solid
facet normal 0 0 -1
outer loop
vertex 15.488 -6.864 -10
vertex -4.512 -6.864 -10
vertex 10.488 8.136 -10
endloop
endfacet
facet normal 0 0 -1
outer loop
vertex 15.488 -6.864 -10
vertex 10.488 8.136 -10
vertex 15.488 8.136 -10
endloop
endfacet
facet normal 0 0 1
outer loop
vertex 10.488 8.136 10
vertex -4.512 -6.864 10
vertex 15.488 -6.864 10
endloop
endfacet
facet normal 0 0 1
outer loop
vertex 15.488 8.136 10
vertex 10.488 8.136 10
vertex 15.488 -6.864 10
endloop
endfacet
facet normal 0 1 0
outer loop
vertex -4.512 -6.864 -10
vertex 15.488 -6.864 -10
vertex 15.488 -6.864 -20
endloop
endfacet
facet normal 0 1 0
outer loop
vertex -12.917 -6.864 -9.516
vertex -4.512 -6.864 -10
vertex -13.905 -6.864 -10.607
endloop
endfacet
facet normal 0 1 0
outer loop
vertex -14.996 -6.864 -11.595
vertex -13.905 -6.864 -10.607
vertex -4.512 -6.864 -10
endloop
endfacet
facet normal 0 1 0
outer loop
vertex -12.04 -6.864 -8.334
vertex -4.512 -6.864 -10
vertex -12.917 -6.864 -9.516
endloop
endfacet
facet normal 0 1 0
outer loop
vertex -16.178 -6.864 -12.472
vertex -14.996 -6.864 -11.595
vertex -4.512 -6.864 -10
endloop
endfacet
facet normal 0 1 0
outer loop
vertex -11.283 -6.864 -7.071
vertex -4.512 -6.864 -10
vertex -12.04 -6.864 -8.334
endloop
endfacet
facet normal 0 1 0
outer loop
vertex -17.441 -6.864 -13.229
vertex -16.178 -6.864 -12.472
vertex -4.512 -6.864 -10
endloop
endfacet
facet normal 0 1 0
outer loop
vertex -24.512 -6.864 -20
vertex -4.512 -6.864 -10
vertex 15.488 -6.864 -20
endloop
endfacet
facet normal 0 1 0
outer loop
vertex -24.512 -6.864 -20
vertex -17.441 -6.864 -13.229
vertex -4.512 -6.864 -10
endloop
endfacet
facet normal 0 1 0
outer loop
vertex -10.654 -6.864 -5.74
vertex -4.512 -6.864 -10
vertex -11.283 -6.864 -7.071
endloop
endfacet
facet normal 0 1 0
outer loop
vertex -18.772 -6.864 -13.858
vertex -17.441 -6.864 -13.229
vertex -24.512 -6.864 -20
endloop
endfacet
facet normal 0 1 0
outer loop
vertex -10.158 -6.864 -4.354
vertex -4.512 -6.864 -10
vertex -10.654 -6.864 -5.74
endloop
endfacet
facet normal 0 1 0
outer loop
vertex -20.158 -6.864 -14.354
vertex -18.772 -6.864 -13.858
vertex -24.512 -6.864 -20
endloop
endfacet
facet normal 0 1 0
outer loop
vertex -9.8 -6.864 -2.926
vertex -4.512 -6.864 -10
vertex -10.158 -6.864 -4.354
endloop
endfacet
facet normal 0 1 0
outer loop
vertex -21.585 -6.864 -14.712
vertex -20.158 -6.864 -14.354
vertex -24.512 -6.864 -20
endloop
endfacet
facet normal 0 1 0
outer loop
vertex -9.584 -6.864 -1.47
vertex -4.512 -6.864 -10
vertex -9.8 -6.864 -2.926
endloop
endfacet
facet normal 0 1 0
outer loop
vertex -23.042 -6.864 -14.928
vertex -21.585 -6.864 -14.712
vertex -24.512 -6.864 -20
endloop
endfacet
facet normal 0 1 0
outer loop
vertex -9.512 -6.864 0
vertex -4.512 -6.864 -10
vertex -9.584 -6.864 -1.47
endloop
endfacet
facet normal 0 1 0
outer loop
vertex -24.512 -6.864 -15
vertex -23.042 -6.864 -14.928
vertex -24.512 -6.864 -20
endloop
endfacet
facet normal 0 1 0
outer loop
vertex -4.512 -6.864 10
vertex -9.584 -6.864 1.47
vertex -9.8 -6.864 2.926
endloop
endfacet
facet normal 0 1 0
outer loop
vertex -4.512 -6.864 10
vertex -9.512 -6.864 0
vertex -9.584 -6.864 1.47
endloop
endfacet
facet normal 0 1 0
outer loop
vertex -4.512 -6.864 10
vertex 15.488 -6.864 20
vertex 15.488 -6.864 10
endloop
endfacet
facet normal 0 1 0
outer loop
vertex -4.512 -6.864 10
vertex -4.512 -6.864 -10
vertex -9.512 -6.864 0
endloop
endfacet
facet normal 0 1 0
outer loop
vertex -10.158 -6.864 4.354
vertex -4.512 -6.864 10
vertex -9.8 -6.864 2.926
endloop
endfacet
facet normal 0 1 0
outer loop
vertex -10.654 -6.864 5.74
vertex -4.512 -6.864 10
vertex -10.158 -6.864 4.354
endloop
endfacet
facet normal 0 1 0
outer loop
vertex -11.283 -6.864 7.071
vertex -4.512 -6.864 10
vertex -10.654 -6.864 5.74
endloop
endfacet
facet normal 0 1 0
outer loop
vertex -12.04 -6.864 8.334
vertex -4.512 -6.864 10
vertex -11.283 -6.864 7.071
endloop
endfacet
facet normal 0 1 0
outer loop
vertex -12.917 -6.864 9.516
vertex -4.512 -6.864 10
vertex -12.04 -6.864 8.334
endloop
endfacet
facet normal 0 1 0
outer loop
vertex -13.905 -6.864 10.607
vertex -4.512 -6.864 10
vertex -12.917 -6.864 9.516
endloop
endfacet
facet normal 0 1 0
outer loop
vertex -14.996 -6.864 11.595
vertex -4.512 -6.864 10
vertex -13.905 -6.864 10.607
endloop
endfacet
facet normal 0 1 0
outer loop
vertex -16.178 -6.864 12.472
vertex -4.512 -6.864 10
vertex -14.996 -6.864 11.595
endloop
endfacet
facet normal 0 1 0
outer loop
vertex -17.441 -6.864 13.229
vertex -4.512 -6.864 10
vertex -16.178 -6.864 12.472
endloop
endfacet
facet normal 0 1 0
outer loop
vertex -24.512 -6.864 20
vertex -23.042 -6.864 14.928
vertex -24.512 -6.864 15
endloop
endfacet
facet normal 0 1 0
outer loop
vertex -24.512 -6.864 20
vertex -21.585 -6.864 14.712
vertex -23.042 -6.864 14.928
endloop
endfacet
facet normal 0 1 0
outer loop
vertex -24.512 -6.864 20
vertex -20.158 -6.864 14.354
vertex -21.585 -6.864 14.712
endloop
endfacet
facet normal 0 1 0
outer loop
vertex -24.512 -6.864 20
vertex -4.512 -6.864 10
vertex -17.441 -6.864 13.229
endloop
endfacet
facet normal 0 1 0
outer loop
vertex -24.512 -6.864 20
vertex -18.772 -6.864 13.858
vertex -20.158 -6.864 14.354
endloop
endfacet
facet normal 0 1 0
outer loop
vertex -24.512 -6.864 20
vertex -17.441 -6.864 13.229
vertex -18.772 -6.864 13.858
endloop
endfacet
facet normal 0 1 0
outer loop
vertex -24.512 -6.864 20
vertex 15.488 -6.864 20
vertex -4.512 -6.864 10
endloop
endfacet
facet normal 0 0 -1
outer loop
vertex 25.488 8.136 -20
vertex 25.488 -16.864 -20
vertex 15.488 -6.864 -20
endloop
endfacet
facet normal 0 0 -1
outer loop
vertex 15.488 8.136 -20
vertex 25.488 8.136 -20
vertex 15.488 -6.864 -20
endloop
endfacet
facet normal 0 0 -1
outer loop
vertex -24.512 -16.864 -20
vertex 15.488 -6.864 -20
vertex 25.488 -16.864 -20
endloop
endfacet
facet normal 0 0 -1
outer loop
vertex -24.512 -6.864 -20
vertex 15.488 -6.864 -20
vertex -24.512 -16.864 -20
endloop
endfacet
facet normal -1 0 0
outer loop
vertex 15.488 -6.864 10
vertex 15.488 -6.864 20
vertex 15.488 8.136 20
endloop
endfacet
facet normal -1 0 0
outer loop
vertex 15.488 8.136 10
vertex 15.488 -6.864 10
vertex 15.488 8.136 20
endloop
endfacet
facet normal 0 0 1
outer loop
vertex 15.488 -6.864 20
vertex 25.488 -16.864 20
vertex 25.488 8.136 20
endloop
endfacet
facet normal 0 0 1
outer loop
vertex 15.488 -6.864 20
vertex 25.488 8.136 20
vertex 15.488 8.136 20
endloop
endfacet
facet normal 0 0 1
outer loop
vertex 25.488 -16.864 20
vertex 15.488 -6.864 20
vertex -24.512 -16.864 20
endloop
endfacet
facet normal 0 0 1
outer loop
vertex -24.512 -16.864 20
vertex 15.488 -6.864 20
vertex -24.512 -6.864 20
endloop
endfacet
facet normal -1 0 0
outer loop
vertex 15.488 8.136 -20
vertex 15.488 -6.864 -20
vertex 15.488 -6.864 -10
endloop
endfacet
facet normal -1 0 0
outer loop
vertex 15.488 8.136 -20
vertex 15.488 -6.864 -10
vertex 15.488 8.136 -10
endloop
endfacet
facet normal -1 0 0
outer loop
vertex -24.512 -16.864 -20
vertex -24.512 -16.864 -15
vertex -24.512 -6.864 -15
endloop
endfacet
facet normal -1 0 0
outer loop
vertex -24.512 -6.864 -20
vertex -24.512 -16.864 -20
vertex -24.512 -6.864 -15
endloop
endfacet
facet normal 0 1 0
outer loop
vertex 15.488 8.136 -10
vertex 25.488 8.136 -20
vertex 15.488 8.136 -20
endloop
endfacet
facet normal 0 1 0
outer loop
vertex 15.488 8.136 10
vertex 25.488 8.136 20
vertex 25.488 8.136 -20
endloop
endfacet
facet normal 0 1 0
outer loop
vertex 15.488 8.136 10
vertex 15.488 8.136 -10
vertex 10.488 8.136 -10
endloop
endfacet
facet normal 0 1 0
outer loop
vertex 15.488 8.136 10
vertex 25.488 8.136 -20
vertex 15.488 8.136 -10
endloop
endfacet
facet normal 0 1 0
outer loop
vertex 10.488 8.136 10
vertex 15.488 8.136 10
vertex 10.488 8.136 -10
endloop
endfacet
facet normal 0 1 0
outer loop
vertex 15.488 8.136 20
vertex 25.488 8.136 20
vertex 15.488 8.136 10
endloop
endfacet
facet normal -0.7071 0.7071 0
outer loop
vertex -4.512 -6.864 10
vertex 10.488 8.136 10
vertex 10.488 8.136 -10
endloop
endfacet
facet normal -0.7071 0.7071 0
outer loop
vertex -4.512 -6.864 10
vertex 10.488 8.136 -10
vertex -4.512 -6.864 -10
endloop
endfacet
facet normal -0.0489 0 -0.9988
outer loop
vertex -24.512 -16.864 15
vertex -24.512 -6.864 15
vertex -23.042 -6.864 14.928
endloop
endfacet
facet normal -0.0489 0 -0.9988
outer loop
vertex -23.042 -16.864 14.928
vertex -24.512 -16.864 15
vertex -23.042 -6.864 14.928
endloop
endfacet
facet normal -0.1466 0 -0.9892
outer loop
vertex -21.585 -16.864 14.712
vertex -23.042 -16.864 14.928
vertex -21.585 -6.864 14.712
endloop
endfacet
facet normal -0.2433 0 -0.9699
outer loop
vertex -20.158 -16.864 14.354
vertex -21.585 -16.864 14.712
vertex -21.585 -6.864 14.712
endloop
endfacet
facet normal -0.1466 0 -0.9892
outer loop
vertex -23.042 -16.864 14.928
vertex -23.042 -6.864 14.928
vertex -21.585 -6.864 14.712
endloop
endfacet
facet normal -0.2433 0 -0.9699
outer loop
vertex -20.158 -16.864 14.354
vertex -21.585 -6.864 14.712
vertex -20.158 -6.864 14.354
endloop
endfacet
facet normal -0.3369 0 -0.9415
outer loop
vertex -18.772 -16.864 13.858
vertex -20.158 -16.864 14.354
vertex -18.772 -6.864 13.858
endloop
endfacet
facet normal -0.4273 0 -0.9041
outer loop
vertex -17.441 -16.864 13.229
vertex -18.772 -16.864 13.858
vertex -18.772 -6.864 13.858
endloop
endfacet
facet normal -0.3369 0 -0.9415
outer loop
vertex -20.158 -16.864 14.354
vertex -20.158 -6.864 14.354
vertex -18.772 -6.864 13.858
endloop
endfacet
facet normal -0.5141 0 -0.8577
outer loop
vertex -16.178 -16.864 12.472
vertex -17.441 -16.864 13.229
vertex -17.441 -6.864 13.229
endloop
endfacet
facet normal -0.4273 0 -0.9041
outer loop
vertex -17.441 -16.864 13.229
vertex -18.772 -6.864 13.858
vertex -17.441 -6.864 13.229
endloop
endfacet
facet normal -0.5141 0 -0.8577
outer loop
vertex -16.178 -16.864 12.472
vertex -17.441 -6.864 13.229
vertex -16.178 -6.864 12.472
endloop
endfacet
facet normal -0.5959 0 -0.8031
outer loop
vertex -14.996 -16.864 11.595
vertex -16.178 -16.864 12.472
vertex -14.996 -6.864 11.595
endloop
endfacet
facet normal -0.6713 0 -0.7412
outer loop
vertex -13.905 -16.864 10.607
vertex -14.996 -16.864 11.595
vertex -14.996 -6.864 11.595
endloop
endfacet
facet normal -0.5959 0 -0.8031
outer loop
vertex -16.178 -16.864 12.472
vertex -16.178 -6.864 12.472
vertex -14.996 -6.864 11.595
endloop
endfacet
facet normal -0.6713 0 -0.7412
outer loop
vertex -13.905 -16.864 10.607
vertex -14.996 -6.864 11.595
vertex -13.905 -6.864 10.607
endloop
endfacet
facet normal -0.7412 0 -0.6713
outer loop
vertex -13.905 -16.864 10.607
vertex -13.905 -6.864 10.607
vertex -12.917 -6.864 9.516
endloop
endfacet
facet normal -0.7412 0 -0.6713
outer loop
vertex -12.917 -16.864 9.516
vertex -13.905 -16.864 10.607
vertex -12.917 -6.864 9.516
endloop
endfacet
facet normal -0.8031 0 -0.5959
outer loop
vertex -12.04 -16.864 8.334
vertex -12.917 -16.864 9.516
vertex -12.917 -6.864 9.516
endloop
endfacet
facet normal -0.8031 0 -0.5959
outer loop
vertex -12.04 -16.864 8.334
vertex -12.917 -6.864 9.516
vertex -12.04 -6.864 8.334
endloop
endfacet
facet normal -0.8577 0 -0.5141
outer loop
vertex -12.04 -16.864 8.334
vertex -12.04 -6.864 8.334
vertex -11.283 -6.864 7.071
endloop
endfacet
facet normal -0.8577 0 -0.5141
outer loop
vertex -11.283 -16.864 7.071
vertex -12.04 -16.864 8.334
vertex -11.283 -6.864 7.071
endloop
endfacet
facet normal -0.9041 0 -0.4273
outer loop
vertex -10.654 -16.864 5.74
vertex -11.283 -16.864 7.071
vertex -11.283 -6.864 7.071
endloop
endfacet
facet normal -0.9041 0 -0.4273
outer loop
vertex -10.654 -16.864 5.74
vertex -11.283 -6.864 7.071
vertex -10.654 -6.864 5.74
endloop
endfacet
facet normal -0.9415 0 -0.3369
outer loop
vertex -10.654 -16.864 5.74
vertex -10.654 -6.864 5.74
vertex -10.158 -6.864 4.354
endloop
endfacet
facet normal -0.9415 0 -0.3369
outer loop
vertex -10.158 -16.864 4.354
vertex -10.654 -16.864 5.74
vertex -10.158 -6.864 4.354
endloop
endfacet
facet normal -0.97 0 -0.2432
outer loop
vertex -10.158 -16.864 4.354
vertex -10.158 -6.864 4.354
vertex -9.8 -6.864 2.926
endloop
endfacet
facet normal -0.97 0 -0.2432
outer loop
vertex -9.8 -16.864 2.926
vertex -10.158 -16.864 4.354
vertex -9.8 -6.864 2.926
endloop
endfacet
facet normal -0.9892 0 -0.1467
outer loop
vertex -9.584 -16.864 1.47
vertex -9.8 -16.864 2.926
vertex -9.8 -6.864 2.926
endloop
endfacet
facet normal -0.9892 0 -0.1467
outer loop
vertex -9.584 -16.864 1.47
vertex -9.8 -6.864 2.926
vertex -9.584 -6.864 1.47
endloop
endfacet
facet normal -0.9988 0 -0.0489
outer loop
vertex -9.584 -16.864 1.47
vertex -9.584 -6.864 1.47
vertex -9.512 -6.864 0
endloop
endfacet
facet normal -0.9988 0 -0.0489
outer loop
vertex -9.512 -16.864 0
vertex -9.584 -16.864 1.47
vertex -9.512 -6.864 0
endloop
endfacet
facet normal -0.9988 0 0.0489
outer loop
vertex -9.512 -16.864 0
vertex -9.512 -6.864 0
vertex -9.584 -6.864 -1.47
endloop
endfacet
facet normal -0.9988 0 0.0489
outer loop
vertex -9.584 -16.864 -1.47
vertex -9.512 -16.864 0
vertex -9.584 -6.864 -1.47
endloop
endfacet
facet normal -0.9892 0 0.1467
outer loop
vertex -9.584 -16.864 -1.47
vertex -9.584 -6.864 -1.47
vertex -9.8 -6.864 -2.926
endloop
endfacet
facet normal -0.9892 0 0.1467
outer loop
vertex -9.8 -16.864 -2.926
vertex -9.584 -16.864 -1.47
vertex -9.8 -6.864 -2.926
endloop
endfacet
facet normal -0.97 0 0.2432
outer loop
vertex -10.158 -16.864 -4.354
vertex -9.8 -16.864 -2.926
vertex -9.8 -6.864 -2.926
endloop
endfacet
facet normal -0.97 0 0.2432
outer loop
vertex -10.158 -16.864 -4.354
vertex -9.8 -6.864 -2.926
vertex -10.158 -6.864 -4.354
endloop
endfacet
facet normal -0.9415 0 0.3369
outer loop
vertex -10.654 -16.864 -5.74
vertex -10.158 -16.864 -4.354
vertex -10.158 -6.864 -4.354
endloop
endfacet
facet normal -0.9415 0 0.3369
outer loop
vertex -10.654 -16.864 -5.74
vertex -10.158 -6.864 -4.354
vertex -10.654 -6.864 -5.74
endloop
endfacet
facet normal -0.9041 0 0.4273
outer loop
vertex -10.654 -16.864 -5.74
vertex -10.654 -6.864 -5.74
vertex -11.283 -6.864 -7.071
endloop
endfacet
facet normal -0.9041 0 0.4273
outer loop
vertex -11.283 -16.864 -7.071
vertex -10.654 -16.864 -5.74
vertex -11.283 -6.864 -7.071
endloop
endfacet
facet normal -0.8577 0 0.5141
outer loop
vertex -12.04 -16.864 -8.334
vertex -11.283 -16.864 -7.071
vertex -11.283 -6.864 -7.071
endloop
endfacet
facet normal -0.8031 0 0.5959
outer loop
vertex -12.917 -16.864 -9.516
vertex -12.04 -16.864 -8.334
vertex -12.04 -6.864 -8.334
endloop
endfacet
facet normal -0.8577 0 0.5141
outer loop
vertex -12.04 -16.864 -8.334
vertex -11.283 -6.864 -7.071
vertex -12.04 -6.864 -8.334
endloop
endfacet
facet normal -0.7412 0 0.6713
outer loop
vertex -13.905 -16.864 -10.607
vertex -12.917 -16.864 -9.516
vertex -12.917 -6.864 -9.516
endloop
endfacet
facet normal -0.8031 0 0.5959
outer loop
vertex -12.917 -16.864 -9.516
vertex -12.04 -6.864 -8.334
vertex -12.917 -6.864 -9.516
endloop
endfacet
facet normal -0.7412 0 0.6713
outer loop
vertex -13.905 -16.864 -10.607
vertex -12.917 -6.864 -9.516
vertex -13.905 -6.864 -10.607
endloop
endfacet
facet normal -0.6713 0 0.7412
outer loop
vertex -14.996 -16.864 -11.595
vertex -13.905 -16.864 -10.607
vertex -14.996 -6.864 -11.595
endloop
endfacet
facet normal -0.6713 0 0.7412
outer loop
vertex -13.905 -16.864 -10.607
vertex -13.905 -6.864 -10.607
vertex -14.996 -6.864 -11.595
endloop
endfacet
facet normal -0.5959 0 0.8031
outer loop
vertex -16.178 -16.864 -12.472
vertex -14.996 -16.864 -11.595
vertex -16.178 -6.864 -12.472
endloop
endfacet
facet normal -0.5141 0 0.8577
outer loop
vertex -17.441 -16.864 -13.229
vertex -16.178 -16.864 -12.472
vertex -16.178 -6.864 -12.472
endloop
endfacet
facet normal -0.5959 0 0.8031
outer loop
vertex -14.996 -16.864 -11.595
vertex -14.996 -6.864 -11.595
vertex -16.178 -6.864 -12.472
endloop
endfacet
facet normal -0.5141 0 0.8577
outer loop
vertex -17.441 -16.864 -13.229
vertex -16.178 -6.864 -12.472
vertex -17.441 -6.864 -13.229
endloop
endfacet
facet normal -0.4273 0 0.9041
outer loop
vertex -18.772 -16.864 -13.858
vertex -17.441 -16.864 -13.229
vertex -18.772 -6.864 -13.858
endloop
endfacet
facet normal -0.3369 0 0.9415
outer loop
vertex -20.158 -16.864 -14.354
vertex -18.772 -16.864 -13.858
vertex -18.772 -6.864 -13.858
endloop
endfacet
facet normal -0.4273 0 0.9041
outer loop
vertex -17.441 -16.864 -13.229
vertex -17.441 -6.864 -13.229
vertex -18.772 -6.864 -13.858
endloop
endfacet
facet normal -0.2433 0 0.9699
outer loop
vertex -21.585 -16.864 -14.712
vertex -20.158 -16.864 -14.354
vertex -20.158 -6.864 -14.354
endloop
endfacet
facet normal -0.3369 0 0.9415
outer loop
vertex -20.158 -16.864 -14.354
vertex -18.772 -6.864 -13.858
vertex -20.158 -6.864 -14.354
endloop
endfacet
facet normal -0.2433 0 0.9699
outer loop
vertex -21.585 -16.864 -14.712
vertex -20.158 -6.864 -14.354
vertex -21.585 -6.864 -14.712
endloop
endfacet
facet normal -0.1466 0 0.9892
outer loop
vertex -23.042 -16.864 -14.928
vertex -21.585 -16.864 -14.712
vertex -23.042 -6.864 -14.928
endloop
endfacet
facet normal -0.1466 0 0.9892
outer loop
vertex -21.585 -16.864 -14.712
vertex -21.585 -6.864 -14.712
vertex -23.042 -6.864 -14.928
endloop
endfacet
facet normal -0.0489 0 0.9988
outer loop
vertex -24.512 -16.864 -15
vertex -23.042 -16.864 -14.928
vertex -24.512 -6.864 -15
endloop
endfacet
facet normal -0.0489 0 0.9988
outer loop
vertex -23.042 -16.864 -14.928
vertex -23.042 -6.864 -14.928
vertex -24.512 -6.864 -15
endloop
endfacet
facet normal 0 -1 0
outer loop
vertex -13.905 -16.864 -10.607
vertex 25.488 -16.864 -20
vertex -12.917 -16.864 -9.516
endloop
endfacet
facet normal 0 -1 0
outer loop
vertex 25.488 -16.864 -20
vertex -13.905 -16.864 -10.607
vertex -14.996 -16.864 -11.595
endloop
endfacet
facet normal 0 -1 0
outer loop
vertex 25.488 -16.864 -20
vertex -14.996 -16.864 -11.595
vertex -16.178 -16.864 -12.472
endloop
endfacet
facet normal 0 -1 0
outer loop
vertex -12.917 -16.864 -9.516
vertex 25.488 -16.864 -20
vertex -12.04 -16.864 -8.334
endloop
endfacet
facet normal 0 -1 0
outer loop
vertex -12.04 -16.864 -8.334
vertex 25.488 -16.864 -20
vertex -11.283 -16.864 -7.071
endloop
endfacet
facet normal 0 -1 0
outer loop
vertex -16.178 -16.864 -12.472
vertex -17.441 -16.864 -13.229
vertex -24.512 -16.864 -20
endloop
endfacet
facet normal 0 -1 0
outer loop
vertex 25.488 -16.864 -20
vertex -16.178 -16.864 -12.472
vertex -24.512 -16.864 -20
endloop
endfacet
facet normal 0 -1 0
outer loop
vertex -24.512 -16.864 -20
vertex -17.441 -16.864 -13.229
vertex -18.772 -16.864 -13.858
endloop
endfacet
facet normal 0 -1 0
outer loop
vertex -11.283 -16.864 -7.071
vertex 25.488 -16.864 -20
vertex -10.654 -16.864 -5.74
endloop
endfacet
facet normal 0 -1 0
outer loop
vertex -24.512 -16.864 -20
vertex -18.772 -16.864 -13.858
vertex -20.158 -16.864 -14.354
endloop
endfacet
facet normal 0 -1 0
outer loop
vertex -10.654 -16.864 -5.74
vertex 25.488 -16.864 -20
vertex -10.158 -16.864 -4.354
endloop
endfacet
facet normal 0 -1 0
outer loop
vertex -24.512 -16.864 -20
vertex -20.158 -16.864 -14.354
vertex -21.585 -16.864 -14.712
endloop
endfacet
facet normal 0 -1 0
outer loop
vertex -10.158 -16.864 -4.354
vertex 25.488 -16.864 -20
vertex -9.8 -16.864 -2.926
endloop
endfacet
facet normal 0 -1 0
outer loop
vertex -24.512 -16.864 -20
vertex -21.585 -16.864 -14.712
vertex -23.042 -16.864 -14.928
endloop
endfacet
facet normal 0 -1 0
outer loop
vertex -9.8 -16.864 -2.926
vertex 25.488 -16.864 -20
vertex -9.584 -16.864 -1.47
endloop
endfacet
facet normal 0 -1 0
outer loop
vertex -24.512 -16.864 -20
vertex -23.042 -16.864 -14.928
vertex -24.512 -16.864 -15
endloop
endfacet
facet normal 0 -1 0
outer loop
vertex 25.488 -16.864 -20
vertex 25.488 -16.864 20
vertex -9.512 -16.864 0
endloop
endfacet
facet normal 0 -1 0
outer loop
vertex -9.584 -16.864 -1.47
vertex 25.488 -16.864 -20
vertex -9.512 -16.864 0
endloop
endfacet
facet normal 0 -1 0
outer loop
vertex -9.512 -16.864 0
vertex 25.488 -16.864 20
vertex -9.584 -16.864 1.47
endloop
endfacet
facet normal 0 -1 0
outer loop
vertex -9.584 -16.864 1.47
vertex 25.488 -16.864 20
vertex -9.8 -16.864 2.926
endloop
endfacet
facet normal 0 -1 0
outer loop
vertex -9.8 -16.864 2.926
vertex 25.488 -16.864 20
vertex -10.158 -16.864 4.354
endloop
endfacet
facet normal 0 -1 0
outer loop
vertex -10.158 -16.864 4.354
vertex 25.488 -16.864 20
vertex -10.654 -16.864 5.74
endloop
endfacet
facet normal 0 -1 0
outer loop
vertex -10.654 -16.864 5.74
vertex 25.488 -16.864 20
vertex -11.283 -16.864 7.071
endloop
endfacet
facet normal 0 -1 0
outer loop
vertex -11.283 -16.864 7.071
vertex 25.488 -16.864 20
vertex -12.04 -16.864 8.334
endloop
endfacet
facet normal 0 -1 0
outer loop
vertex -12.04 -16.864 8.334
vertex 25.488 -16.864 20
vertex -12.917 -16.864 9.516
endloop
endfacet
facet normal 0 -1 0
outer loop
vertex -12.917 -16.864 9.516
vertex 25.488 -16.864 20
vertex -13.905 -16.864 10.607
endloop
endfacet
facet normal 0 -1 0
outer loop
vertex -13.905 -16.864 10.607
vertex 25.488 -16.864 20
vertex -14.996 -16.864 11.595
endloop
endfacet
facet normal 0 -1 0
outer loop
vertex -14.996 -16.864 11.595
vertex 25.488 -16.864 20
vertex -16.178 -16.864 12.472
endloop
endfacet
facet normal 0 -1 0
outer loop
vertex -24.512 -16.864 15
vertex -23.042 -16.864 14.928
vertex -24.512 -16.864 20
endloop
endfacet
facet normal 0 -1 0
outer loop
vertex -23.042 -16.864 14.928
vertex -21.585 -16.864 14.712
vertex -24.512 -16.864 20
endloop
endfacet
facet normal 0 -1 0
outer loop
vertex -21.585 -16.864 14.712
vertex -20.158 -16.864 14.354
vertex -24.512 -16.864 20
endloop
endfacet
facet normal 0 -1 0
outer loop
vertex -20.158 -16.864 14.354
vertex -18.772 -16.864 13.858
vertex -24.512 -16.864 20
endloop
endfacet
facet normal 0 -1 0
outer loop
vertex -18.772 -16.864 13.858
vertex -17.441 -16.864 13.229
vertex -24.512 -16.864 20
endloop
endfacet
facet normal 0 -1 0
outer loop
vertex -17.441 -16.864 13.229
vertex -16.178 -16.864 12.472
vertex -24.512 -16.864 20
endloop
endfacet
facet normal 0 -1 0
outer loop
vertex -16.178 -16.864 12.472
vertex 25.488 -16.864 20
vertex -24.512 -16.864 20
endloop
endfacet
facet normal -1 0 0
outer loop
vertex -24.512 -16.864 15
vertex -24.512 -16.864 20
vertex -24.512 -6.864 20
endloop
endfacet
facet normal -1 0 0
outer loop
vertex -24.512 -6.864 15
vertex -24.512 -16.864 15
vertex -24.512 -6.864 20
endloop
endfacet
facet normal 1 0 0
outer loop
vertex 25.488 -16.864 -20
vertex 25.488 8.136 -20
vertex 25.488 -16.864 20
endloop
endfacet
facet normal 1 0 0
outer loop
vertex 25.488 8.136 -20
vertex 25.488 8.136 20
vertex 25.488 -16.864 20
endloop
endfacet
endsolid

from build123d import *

# Parameters (mm, degrees)
BOSS_EXTRUDE1_DEPTH     = 20
CUT_EXTRUDE1_DEPTH      = 1
CUT_EXTRUDE1_DEPTH_BACK = 10
CUT_EXTRUDE2_DEPTH      = 10
CUT_EXTRUDE3_REACH      = 12


with BuildPart() as part:
    # Sketch1 → Boss-Extrude1 (new body, symmetric)
    with BuildSketch(Plane.XY):
        Polygon((-4.511794911, -6.86440678), (15.488205089, -6.86440678), (15.488205089, 8.13559322), (25.488205089, 8.13559322), (25.488205089, -16.86440678), (-24.511794911, -16.86440678), (-24.511794911, -6.86440678), align=None)
        Polygon((10.488205089, 8.13559322), (-4.511794911, -6.86440678), (15.488205089, -6.86440678), (15.488205089, 8.13559322), align=None)
    extrude(amount=BOSS_EXTRUDE1_DEPTH, both=True)

    # Sketch2 → Cut-Extrude1 (cut, two sides)
    with BuildSketch(Plane.XY.offset(20)) as cut_extrude1_sk:
        Polygon((-4.511794911, -6.86440678), (15.488205089, -6.86440678), (15.488205089, 8.13559322), (10.488205089, 8.13559322), align=None)
    extrude(amount=CUT_EXTRUDE1_DEPTH, mode=Mode.SUBTRACT)
    extrude(cut_extrude1_sk.sketch, amount=-CUT_EXTRUDE1_DEPTH_BACK, mode=Mode.SUBTRACT)

    # Sketch3 → Cut-Extrude2 (cut)
    with BuildSketch(Plane(origin=(0, 0, -20), x_dir=(-1, 0, 0), z_dir=(0, 0, -1))):
        Polygon((4.511794911, -6.86440678), (-15.488205089, -6.86440678), (-15.488205089, 8.13559322), (-10.488205089, 8.13559322), align=None)
    extrude(amount=-CUT_EXTRUDE2_DEPTH, mode=Mode.SUBTRACT)

    # Sketch4 → Cut-Extrude3 (cut, up to next)
    with BuildSketch(Plane(origin=(0, -6.86440678, 0), x_dir=(1, 0, 0), z_dir=(0, 1, 0)), mode=Mode.PRIVATE) as cut_extrude3_sk1:
        with BuildLine():
            Line((-24.511794911, 15), (-24.511794911, -15))
            ThreePointArc((-24.511794911, -15), (-9.511794911, 0), (-24.511794911, 15))
        make_face()
    cut_extrude3_tool1 = extrude(cut_extrude3_sk1.sketch, amount=-CUT_EXTRUDE3_REACH, mode=Mode.PRIVATE) & part.part
    add(cut_extrude3_tool1.solids().sort_by_distance((-18.145597, -6.864407, 0))[0], mode=Mode.SUBTRACT)


solid = part.part
